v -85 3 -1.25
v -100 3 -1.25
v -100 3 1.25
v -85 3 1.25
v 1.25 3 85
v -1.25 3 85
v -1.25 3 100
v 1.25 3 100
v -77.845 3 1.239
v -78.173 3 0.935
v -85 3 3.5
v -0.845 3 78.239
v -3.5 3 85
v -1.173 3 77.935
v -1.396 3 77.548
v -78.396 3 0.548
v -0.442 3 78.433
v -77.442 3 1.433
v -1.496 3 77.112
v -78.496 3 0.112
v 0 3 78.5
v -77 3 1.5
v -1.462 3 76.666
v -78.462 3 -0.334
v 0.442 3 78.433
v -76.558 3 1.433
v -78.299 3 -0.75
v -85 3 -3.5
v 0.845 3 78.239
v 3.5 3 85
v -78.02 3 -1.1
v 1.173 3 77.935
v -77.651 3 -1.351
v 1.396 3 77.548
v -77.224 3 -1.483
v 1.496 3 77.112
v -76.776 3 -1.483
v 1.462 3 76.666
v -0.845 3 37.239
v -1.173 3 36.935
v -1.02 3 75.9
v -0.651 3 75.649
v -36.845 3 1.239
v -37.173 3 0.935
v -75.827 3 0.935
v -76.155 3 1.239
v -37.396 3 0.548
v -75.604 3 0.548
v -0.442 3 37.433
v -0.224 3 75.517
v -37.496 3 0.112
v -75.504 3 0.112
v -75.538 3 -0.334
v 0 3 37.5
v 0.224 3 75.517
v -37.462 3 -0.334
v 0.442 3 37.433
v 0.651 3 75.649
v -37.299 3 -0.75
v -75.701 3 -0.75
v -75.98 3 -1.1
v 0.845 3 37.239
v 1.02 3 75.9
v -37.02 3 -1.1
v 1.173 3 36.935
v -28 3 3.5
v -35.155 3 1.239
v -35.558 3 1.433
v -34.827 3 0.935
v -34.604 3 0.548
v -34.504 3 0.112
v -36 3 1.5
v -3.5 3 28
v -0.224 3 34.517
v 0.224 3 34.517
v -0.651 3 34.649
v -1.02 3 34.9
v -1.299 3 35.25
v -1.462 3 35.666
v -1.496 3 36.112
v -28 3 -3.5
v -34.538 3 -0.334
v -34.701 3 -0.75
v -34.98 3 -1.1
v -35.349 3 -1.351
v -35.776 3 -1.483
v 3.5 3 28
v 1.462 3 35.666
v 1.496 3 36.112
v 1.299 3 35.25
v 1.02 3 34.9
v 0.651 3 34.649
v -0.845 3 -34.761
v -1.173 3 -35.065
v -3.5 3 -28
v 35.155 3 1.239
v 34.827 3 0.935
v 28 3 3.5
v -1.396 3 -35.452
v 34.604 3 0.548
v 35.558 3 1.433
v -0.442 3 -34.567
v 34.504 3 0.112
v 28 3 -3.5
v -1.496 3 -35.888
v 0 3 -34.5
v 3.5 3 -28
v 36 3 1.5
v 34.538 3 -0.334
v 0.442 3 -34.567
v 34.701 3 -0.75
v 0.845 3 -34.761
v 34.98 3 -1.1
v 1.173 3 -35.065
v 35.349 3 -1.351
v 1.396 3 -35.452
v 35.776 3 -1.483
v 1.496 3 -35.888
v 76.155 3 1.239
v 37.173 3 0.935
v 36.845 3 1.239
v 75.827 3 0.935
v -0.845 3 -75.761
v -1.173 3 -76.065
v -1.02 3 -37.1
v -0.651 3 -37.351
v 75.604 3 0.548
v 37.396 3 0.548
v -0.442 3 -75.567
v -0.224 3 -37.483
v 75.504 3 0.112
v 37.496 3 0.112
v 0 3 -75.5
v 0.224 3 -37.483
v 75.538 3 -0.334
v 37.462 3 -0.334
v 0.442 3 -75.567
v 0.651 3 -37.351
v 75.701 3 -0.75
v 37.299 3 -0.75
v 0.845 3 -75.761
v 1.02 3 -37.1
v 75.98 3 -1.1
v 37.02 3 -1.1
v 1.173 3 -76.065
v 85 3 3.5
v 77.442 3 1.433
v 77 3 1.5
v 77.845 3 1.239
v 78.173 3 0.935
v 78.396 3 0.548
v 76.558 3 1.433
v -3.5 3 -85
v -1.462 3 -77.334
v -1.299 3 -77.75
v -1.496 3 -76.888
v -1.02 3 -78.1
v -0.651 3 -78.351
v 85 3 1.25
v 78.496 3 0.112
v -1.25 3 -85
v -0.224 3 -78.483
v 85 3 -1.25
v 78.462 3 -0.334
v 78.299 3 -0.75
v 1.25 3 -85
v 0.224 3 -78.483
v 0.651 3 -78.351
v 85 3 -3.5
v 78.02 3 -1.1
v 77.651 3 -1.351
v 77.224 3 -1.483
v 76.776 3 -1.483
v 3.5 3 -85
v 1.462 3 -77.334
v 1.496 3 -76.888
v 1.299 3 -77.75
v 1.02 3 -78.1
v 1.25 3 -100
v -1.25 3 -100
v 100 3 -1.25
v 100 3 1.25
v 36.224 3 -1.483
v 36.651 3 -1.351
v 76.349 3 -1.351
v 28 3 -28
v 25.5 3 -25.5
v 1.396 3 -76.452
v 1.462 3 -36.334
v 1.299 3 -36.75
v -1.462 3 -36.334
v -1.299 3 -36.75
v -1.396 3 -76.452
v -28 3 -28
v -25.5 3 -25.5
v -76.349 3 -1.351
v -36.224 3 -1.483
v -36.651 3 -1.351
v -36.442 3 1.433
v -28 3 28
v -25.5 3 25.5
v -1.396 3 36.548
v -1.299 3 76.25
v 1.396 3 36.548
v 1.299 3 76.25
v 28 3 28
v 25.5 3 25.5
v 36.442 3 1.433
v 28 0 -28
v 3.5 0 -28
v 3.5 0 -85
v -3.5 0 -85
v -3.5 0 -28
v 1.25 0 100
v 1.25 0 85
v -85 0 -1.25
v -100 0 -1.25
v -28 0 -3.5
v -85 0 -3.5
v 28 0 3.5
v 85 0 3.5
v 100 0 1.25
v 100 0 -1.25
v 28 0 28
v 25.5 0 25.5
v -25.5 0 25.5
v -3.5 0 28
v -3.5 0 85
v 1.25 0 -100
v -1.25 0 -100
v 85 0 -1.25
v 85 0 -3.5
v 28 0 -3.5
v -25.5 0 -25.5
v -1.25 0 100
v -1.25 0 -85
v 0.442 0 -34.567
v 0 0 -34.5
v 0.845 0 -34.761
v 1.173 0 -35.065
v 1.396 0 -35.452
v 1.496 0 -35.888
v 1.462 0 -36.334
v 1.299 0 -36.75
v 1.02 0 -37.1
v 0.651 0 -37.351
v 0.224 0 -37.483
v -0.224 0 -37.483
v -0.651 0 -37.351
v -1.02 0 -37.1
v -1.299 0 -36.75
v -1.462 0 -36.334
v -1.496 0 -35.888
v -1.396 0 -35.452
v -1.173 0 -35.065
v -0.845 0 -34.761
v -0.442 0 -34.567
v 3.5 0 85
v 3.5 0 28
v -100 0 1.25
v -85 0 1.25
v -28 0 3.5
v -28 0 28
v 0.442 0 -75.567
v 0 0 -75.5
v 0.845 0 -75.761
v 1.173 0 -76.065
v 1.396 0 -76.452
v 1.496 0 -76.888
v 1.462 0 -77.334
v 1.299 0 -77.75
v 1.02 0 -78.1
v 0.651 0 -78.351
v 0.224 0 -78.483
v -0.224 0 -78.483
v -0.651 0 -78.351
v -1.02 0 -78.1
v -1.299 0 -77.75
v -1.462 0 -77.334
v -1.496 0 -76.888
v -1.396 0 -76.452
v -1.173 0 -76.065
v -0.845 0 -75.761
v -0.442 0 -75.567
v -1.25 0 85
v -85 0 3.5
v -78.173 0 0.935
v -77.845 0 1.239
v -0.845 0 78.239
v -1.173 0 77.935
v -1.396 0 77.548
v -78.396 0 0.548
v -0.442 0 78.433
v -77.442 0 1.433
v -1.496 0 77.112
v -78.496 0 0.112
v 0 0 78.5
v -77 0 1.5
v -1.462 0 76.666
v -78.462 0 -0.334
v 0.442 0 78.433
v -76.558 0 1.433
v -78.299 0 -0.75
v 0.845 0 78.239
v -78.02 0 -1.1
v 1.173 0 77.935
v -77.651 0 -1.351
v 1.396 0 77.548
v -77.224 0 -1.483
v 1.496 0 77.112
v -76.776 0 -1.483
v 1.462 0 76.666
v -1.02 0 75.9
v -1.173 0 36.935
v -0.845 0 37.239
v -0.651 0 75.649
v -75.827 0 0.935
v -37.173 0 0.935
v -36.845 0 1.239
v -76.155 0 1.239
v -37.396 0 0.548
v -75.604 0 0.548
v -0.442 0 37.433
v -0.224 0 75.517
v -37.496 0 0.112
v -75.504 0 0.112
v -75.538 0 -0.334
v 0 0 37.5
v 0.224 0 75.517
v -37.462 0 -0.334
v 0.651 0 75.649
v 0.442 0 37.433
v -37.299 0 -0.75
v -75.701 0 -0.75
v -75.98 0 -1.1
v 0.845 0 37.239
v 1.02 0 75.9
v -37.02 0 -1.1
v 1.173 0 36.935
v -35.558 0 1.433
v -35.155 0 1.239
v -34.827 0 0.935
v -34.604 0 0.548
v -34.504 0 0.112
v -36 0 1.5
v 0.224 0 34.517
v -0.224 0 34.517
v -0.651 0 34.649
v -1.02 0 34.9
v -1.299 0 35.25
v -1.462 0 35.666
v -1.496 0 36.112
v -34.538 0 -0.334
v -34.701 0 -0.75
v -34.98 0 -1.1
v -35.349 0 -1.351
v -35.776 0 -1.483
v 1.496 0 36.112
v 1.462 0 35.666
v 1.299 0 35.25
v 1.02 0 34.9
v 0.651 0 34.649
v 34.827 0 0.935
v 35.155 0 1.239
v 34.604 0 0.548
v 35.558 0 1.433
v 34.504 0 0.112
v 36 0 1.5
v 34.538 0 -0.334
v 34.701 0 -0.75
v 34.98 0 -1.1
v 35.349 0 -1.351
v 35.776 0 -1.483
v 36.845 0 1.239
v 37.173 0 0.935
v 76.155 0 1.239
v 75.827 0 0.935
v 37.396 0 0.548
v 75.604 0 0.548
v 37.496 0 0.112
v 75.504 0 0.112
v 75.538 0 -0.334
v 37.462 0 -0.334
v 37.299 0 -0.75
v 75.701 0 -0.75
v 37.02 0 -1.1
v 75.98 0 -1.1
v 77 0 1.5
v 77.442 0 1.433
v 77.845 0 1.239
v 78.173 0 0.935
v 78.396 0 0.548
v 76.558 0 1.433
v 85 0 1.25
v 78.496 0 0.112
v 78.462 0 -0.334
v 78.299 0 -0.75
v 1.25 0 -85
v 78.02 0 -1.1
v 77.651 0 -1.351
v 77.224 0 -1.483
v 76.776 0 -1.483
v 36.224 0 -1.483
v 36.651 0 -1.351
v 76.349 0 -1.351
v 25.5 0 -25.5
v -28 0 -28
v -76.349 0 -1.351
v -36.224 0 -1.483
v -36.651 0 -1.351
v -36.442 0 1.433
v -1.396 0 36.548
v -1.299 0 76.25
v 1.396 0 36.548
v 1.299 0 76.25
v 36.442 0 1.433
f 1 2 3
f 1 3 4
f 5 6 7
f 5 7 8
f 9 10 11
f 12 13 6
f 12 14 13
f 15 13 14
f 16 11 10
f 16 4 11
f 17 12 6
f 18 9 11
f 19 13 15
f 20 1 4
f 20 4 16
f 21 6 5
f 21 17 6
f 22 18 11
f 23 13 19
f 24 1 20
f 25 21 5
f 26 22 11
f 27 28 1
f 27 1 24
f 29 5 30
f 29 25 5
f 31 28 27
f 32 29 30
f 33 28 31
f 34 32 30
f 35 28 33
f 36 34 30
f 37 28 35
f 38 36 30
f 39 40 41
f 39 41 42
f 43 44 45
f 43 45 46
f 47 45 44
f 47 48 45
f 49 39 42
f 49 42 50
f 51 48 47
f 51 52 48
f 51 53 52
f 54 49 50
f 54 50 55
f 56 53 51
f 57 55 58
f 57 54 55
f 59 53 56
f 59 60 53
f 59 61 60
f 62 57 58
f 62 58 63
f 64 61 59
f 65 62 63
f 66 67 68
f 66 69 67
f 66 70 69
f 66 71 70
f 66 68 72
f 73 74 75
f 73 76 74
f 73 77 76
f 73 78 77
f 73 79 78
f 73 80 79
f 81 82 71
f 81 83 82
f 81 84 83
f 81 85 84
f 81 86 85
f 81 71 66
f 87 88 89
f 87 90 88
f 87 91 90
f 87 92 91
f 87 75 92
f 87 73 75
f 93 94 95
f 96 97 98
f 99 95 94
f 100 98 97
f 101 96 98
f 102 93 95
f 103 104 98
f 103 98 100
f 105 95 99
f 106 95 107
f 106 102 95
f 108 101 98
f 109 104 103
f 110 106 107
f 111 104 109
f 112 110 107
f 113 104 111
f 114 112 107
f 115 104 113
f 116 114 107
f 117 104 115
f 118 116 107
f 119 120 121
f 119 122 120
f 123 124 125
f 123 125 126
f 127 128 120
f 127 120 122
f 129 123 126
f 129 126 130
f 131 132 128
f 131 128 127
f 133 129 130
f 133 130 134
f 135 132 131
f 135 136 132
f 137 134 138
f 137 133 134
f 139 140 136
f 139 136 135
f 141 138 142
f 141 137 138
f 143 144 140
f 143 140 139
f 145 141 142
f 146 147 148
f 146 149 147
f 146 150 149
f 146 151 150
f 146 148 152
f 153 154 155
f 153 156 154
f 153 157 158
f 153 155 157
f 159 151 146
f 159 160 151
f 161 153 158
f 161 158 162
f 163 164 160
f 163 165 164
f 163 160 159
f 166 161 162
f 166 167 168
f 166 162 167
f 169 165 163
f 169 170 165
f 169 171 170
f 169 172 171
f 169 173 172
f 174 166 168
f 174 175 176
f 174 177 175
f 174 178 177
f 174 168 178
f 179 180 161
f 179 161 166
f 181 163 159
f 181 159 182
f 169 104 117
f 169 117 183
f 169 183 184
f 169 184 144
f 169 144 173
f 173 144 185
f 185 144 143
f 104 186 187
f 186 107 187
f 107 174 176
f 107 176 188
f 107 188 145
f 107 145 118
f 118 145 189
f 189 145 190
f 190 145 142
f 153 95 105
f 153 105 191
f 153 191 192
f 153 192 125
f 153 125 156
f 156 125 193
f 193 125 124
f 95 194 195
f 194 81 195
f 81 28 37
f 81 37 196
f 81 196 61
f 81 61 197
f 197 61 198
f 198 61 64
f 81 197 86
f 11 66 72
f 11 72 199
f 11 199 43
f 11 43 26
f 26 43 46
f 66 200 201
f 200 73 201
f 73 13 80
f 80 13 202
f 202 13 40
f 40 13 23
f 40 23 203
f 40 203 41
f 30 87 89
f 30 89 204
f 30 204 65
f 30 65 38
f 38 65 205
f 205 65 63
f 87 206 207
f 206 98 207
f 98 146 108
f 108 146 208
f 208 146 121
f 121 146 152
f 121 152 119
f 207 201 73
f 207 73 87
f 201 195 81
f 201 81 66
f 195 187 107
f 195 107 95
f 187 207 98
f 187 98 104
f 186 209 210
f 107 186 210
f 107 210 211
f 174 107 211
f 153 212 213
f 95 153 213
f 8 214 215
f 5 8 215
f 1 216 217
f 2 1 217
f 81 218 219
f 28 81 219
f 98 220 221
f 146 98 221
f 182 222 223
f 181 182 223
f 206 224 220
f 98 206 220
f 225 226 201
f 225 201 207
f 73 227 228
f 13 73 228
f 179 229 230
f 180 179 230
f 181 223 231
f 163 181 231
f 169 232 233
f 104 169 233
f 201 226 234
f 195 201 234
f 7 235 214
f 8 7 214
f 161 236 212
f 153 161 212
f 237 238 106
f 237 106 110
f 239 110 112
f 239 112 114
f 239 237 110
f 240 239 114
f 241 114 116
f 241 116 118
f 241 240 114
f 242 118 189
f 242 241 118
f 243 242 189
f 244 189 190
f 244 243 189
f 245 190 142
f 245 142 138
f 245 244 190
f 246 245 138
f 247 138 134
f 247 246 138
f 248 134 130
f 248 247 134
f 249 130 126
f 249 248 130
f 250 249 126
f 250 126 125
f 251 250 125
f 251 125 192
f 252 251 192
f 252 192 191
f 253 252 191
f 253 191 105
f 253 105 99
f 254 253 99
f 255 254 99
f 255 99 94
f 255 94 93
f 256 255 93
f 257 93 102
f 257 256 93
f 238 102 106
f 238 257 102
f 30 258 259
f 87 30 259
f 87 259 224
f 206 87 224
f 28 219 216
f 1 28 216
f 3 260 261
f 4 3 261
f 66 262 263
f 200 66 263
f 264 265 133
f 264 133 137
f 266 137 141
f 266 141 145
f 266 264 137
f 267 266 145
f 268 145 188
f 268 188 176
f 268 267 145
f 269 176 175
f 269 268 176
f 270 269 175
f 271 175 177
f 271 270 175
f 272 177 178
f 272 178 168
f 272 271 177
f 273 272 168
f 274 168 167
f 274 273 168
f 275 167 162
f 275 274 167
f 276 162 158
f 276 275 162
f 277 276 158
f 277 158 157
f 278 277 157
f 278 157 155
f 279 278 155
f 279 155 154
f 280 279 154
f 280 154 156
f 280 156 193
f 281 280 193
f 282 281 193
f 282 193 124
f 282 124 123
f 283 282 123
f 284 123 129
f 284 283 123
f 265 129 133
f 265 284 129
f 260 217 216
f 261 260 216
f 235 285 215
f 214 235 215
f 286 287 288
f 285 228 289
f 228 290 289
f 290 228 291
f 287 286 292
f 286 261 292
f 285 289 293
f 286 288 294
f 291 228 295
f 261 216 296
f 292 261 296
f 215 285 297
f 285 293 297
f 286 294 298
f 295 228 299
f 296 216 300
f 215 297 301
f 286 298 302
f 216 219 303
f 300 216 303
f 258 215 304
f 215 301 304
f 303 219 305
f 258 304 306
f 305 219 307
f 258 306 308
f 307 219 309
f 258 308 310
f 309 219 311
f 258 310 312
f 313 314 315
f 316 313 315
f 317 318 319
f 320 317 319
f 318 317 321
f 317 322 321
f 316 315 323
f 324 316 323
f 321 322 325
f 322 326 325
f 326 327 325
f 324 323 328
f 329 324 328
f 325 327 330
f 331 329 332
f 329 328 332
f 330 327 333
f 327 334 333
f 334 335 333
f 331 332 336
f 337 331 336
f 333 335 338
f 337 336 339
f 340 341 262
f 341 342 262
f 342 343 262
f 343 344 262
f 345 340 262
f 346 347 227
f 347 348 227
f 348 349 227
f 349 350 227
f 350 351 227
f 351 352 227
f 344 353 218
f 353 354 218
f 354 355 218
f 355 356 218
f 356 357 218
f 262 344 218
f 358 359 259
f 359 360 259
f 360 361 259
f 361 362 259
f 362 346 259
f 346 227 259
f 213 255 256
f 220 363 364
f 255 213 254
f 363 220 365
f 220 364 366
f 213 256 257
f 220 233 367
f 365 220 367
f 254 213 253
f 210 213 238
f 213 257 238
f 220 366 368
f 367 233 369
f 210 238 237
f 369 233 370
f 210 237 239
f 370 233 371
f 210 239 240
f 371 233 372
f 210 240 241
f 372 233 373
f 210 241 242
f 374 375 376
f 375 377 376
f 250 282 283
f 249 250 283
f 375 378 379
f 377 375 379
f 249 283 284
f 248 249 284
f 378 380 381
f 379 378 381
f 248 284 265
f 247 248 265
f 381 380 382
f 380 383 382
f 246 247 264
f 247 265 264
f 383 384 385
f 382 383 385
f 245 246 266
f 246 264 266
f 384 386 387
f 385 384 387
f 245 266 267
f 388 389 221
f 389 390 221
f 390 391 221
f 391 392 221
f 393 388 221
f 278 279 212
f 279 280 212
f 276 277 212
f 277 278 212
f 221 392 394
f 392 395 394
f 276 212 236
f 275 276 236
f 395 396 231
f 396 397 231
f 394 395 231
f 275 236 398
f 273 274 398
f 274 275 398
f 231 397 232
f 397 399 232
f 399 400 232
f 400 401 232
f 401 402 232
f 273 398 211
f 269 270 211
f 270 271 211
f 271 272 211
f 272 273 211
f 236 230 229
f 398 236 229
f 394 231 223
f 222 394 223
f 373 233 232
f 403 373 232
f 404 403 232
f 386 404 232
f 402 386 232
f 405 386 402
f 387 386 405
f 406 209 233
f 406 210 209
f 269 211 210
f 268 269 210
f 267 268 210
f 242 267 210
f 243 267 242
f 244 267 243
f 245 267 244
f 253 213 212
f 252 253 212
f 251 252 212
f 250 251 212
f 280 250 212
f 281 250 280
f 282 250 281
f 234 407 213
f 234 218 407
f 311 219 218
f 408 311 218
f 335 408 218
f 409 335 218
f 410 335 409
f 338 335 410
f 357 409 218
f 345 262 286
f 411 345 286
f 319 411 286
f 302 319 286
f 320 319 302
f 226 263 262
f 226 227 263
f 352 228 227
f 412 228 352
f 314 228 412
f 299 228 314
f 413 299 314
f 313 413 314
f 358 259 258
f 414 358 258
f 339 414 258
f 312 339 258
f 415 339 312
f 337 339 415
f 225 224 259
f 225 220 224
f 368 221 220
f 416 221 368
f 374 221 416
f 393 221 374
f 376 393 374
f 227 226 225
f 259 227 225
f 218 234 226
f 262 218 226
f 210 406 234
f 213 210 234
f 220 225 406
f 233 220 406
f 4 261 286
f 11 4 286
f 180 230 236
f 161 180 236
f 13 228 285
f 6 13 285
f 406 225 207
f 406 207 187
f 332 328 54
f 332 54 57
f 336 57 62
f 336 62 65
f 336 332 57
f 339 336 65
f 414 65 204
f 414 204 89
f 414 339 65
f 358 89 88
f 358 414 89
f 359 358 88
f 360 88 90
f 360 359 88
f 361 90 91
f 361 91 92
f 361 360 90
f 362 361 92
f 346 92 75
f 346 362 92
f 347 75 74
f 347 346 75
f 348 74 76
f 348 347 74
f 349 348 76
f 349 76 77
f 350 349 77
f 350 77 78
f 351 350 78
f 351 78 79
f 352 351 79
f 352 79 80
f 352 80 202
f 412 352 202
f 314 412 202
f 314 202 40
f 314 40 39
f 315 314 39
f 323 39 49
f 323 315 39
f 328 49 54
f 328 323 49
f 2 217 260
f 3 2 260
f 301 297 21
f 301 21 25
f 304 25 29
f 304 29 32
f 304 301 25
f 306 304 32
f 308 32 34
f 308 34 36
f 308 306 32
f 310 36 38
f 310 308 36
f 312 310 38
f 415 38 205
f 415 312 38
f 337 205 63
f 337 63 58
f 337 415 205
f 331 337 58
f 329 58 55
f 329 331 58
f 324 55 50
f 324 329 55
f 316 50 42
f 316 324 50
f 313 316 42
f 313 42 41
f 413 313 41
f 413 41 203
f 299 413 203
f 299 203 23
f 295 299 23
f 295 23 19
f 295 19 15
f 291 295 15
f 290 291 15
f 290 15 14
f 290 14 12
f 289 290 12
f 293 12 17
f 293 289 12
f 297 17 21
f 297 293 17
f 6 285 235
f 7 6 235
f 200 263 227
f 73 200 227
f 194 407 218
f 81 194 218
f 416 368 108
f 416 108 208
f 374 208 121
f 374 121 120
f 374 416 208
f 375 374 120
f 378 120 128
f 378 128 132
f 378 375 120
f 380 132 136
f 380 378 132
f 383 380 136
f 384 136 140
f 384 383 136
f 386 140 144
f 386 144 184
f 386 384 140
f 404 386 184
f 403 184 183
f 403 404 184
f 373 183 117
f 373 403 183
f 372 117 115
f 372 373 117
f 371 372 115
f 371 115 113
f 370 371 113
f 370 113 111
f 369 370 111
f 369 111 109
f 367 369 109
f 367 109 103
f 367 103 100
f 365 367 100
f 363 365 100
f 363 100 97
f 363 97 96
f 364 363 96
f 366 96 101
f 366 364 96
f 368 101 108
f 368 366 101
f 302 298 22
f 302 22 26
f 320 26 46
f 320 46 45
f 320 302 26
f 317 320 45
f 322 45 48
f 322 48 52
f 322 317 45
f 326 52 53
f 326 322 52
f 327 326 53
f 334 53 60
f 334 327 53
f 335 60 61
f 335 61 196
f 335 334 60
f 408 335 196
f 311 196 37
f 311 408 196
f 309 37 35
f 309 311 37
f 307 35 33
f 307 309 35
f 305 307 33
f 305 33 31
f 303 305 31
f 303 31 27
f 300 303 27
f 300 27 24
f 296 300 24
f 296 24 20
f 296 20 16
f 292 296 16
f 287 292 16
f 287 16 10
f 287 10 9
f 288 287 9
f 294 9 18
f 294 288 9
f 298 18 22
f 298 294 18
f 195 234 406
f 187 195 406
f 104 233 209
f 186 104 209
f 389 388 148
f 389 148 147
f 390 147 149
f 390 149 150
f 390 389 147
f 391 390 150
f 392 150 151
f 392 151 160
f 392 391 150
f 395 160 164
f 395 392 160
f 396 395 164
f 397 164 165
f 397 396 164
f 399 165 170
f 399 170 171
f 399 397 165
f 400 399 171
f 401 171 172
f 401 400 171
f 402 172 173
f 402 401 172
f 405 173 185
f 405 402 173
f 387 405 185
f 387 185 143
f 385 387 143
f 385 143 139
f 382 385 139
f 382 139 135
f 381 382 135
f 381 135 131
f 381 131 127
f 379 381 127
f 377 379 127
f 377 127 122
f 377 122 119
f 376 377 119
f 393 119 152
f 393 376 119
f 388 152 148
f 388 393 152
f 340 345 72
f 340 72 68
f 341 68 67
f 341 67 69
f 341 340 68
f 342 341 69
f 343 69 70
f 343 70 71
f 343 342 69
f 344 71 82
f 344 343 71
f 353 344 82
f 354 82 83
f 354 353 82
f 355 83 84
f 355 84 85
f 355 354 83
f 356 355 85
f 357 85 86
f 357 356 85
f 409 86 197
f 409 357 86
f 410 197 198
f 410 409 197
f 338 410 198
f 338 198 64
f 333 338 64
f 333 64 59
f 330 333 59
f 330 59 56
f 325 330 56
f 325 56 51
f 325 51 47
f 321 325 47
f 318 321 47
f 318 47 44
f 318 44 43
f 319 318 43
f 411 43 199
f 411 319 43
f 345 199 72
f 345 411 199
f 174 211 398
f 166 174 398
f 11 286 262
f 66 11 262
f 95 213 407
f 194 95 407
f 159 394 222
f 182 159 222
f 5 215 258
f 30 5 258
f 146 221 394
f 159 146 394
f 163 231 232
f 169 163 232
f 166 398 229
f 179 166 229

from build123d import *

# Parameters (mm, degrees)
SKETCH1_W           = 51
SKETCH1_H           = 51
SKETCH1_R           = 1.5
BOSS_EXTRUDE1_DEPTH = 3


with BuildPart() as part:
    # Sketch1 → Boss-Extrude1 (new body)
    with BuildSketch(Plane(origin=(0, 0, 0), x_dir=(1, 0, 0), z_dir=(0, 1, 0))):
        Polygon((85, 1.25), (85, 3.5), (28, 3.5), (28, 28), (3.5, 28), (3.5, 85), (1.25, 85), (1.25, 100), (-1.25, 100), (-1.25, 85), (-3.5, 85), (-3.5, 28), (-28, 28), (-28, 3.5), (-85, 3.5), (-85, 1.25), (-100, 1.25), (-100, -1.25), (-85, -1.25), (-85, -3.5), (-28, -3.5), (-28, -28), (-3.5, -28), (-3.5, -85), (-1.25, -85), (-1.25, -100), (1.25, -100), (1.25, -85), (3.5, -85), (3.5, -28), (28, -28), (28, -3.5), (85, -3.5), (85, -1.25), (100, -1.25), (100, 1.25), align=None)
        Rectangle(SKETCH1_W, SKETCH1_H, mode=Mode.SUBTRACT)
        with Locations(Location((36, 0, 0), (0, 0, 270))):
            Circle(SKETCH1_R, mode=Mode.SUBTRACT)
        with Locations(Location((77, 0, 0), (0, 0, 270))):
            Circle(SKETCH1_R, mode=Mode.SUBTRACT)
        with Locations(Location((0, 77, 0), (0, 0, 270))):
            Circle(SKETCH1_R, mode=Mode.SUBTRACT)
        with Locations(Location((0, 36, 0), (0, 0, 270))):
            Circle(SKETCH1_R, mode=Mode.SUBTRACT)
        with Locations(Location((0, -36, 0), (0, 0, 270))):
            Circle(SKETCH1_R, mode=Mode.SUBTRACT)
        with Locations(Location((0, -77, 0), (0, 0, 270))):
            Circle(SKETCH1_R, mode=Mode.SUBTRACT)
        with Locations(Location((-36, 0, 0), (0, 0, 270))):
            Circle(SKETCH1_R, mode=Mode.SUBTRACT)
        with Locations(Location((-77, 0, 0), (0, 0, 270))):
            Circle(SKETCH1_R, mode=Mode.SUBTRACT)
    extrude(amount=BOSS_EXTRUDE1_DEPTH)


solid = part.part
